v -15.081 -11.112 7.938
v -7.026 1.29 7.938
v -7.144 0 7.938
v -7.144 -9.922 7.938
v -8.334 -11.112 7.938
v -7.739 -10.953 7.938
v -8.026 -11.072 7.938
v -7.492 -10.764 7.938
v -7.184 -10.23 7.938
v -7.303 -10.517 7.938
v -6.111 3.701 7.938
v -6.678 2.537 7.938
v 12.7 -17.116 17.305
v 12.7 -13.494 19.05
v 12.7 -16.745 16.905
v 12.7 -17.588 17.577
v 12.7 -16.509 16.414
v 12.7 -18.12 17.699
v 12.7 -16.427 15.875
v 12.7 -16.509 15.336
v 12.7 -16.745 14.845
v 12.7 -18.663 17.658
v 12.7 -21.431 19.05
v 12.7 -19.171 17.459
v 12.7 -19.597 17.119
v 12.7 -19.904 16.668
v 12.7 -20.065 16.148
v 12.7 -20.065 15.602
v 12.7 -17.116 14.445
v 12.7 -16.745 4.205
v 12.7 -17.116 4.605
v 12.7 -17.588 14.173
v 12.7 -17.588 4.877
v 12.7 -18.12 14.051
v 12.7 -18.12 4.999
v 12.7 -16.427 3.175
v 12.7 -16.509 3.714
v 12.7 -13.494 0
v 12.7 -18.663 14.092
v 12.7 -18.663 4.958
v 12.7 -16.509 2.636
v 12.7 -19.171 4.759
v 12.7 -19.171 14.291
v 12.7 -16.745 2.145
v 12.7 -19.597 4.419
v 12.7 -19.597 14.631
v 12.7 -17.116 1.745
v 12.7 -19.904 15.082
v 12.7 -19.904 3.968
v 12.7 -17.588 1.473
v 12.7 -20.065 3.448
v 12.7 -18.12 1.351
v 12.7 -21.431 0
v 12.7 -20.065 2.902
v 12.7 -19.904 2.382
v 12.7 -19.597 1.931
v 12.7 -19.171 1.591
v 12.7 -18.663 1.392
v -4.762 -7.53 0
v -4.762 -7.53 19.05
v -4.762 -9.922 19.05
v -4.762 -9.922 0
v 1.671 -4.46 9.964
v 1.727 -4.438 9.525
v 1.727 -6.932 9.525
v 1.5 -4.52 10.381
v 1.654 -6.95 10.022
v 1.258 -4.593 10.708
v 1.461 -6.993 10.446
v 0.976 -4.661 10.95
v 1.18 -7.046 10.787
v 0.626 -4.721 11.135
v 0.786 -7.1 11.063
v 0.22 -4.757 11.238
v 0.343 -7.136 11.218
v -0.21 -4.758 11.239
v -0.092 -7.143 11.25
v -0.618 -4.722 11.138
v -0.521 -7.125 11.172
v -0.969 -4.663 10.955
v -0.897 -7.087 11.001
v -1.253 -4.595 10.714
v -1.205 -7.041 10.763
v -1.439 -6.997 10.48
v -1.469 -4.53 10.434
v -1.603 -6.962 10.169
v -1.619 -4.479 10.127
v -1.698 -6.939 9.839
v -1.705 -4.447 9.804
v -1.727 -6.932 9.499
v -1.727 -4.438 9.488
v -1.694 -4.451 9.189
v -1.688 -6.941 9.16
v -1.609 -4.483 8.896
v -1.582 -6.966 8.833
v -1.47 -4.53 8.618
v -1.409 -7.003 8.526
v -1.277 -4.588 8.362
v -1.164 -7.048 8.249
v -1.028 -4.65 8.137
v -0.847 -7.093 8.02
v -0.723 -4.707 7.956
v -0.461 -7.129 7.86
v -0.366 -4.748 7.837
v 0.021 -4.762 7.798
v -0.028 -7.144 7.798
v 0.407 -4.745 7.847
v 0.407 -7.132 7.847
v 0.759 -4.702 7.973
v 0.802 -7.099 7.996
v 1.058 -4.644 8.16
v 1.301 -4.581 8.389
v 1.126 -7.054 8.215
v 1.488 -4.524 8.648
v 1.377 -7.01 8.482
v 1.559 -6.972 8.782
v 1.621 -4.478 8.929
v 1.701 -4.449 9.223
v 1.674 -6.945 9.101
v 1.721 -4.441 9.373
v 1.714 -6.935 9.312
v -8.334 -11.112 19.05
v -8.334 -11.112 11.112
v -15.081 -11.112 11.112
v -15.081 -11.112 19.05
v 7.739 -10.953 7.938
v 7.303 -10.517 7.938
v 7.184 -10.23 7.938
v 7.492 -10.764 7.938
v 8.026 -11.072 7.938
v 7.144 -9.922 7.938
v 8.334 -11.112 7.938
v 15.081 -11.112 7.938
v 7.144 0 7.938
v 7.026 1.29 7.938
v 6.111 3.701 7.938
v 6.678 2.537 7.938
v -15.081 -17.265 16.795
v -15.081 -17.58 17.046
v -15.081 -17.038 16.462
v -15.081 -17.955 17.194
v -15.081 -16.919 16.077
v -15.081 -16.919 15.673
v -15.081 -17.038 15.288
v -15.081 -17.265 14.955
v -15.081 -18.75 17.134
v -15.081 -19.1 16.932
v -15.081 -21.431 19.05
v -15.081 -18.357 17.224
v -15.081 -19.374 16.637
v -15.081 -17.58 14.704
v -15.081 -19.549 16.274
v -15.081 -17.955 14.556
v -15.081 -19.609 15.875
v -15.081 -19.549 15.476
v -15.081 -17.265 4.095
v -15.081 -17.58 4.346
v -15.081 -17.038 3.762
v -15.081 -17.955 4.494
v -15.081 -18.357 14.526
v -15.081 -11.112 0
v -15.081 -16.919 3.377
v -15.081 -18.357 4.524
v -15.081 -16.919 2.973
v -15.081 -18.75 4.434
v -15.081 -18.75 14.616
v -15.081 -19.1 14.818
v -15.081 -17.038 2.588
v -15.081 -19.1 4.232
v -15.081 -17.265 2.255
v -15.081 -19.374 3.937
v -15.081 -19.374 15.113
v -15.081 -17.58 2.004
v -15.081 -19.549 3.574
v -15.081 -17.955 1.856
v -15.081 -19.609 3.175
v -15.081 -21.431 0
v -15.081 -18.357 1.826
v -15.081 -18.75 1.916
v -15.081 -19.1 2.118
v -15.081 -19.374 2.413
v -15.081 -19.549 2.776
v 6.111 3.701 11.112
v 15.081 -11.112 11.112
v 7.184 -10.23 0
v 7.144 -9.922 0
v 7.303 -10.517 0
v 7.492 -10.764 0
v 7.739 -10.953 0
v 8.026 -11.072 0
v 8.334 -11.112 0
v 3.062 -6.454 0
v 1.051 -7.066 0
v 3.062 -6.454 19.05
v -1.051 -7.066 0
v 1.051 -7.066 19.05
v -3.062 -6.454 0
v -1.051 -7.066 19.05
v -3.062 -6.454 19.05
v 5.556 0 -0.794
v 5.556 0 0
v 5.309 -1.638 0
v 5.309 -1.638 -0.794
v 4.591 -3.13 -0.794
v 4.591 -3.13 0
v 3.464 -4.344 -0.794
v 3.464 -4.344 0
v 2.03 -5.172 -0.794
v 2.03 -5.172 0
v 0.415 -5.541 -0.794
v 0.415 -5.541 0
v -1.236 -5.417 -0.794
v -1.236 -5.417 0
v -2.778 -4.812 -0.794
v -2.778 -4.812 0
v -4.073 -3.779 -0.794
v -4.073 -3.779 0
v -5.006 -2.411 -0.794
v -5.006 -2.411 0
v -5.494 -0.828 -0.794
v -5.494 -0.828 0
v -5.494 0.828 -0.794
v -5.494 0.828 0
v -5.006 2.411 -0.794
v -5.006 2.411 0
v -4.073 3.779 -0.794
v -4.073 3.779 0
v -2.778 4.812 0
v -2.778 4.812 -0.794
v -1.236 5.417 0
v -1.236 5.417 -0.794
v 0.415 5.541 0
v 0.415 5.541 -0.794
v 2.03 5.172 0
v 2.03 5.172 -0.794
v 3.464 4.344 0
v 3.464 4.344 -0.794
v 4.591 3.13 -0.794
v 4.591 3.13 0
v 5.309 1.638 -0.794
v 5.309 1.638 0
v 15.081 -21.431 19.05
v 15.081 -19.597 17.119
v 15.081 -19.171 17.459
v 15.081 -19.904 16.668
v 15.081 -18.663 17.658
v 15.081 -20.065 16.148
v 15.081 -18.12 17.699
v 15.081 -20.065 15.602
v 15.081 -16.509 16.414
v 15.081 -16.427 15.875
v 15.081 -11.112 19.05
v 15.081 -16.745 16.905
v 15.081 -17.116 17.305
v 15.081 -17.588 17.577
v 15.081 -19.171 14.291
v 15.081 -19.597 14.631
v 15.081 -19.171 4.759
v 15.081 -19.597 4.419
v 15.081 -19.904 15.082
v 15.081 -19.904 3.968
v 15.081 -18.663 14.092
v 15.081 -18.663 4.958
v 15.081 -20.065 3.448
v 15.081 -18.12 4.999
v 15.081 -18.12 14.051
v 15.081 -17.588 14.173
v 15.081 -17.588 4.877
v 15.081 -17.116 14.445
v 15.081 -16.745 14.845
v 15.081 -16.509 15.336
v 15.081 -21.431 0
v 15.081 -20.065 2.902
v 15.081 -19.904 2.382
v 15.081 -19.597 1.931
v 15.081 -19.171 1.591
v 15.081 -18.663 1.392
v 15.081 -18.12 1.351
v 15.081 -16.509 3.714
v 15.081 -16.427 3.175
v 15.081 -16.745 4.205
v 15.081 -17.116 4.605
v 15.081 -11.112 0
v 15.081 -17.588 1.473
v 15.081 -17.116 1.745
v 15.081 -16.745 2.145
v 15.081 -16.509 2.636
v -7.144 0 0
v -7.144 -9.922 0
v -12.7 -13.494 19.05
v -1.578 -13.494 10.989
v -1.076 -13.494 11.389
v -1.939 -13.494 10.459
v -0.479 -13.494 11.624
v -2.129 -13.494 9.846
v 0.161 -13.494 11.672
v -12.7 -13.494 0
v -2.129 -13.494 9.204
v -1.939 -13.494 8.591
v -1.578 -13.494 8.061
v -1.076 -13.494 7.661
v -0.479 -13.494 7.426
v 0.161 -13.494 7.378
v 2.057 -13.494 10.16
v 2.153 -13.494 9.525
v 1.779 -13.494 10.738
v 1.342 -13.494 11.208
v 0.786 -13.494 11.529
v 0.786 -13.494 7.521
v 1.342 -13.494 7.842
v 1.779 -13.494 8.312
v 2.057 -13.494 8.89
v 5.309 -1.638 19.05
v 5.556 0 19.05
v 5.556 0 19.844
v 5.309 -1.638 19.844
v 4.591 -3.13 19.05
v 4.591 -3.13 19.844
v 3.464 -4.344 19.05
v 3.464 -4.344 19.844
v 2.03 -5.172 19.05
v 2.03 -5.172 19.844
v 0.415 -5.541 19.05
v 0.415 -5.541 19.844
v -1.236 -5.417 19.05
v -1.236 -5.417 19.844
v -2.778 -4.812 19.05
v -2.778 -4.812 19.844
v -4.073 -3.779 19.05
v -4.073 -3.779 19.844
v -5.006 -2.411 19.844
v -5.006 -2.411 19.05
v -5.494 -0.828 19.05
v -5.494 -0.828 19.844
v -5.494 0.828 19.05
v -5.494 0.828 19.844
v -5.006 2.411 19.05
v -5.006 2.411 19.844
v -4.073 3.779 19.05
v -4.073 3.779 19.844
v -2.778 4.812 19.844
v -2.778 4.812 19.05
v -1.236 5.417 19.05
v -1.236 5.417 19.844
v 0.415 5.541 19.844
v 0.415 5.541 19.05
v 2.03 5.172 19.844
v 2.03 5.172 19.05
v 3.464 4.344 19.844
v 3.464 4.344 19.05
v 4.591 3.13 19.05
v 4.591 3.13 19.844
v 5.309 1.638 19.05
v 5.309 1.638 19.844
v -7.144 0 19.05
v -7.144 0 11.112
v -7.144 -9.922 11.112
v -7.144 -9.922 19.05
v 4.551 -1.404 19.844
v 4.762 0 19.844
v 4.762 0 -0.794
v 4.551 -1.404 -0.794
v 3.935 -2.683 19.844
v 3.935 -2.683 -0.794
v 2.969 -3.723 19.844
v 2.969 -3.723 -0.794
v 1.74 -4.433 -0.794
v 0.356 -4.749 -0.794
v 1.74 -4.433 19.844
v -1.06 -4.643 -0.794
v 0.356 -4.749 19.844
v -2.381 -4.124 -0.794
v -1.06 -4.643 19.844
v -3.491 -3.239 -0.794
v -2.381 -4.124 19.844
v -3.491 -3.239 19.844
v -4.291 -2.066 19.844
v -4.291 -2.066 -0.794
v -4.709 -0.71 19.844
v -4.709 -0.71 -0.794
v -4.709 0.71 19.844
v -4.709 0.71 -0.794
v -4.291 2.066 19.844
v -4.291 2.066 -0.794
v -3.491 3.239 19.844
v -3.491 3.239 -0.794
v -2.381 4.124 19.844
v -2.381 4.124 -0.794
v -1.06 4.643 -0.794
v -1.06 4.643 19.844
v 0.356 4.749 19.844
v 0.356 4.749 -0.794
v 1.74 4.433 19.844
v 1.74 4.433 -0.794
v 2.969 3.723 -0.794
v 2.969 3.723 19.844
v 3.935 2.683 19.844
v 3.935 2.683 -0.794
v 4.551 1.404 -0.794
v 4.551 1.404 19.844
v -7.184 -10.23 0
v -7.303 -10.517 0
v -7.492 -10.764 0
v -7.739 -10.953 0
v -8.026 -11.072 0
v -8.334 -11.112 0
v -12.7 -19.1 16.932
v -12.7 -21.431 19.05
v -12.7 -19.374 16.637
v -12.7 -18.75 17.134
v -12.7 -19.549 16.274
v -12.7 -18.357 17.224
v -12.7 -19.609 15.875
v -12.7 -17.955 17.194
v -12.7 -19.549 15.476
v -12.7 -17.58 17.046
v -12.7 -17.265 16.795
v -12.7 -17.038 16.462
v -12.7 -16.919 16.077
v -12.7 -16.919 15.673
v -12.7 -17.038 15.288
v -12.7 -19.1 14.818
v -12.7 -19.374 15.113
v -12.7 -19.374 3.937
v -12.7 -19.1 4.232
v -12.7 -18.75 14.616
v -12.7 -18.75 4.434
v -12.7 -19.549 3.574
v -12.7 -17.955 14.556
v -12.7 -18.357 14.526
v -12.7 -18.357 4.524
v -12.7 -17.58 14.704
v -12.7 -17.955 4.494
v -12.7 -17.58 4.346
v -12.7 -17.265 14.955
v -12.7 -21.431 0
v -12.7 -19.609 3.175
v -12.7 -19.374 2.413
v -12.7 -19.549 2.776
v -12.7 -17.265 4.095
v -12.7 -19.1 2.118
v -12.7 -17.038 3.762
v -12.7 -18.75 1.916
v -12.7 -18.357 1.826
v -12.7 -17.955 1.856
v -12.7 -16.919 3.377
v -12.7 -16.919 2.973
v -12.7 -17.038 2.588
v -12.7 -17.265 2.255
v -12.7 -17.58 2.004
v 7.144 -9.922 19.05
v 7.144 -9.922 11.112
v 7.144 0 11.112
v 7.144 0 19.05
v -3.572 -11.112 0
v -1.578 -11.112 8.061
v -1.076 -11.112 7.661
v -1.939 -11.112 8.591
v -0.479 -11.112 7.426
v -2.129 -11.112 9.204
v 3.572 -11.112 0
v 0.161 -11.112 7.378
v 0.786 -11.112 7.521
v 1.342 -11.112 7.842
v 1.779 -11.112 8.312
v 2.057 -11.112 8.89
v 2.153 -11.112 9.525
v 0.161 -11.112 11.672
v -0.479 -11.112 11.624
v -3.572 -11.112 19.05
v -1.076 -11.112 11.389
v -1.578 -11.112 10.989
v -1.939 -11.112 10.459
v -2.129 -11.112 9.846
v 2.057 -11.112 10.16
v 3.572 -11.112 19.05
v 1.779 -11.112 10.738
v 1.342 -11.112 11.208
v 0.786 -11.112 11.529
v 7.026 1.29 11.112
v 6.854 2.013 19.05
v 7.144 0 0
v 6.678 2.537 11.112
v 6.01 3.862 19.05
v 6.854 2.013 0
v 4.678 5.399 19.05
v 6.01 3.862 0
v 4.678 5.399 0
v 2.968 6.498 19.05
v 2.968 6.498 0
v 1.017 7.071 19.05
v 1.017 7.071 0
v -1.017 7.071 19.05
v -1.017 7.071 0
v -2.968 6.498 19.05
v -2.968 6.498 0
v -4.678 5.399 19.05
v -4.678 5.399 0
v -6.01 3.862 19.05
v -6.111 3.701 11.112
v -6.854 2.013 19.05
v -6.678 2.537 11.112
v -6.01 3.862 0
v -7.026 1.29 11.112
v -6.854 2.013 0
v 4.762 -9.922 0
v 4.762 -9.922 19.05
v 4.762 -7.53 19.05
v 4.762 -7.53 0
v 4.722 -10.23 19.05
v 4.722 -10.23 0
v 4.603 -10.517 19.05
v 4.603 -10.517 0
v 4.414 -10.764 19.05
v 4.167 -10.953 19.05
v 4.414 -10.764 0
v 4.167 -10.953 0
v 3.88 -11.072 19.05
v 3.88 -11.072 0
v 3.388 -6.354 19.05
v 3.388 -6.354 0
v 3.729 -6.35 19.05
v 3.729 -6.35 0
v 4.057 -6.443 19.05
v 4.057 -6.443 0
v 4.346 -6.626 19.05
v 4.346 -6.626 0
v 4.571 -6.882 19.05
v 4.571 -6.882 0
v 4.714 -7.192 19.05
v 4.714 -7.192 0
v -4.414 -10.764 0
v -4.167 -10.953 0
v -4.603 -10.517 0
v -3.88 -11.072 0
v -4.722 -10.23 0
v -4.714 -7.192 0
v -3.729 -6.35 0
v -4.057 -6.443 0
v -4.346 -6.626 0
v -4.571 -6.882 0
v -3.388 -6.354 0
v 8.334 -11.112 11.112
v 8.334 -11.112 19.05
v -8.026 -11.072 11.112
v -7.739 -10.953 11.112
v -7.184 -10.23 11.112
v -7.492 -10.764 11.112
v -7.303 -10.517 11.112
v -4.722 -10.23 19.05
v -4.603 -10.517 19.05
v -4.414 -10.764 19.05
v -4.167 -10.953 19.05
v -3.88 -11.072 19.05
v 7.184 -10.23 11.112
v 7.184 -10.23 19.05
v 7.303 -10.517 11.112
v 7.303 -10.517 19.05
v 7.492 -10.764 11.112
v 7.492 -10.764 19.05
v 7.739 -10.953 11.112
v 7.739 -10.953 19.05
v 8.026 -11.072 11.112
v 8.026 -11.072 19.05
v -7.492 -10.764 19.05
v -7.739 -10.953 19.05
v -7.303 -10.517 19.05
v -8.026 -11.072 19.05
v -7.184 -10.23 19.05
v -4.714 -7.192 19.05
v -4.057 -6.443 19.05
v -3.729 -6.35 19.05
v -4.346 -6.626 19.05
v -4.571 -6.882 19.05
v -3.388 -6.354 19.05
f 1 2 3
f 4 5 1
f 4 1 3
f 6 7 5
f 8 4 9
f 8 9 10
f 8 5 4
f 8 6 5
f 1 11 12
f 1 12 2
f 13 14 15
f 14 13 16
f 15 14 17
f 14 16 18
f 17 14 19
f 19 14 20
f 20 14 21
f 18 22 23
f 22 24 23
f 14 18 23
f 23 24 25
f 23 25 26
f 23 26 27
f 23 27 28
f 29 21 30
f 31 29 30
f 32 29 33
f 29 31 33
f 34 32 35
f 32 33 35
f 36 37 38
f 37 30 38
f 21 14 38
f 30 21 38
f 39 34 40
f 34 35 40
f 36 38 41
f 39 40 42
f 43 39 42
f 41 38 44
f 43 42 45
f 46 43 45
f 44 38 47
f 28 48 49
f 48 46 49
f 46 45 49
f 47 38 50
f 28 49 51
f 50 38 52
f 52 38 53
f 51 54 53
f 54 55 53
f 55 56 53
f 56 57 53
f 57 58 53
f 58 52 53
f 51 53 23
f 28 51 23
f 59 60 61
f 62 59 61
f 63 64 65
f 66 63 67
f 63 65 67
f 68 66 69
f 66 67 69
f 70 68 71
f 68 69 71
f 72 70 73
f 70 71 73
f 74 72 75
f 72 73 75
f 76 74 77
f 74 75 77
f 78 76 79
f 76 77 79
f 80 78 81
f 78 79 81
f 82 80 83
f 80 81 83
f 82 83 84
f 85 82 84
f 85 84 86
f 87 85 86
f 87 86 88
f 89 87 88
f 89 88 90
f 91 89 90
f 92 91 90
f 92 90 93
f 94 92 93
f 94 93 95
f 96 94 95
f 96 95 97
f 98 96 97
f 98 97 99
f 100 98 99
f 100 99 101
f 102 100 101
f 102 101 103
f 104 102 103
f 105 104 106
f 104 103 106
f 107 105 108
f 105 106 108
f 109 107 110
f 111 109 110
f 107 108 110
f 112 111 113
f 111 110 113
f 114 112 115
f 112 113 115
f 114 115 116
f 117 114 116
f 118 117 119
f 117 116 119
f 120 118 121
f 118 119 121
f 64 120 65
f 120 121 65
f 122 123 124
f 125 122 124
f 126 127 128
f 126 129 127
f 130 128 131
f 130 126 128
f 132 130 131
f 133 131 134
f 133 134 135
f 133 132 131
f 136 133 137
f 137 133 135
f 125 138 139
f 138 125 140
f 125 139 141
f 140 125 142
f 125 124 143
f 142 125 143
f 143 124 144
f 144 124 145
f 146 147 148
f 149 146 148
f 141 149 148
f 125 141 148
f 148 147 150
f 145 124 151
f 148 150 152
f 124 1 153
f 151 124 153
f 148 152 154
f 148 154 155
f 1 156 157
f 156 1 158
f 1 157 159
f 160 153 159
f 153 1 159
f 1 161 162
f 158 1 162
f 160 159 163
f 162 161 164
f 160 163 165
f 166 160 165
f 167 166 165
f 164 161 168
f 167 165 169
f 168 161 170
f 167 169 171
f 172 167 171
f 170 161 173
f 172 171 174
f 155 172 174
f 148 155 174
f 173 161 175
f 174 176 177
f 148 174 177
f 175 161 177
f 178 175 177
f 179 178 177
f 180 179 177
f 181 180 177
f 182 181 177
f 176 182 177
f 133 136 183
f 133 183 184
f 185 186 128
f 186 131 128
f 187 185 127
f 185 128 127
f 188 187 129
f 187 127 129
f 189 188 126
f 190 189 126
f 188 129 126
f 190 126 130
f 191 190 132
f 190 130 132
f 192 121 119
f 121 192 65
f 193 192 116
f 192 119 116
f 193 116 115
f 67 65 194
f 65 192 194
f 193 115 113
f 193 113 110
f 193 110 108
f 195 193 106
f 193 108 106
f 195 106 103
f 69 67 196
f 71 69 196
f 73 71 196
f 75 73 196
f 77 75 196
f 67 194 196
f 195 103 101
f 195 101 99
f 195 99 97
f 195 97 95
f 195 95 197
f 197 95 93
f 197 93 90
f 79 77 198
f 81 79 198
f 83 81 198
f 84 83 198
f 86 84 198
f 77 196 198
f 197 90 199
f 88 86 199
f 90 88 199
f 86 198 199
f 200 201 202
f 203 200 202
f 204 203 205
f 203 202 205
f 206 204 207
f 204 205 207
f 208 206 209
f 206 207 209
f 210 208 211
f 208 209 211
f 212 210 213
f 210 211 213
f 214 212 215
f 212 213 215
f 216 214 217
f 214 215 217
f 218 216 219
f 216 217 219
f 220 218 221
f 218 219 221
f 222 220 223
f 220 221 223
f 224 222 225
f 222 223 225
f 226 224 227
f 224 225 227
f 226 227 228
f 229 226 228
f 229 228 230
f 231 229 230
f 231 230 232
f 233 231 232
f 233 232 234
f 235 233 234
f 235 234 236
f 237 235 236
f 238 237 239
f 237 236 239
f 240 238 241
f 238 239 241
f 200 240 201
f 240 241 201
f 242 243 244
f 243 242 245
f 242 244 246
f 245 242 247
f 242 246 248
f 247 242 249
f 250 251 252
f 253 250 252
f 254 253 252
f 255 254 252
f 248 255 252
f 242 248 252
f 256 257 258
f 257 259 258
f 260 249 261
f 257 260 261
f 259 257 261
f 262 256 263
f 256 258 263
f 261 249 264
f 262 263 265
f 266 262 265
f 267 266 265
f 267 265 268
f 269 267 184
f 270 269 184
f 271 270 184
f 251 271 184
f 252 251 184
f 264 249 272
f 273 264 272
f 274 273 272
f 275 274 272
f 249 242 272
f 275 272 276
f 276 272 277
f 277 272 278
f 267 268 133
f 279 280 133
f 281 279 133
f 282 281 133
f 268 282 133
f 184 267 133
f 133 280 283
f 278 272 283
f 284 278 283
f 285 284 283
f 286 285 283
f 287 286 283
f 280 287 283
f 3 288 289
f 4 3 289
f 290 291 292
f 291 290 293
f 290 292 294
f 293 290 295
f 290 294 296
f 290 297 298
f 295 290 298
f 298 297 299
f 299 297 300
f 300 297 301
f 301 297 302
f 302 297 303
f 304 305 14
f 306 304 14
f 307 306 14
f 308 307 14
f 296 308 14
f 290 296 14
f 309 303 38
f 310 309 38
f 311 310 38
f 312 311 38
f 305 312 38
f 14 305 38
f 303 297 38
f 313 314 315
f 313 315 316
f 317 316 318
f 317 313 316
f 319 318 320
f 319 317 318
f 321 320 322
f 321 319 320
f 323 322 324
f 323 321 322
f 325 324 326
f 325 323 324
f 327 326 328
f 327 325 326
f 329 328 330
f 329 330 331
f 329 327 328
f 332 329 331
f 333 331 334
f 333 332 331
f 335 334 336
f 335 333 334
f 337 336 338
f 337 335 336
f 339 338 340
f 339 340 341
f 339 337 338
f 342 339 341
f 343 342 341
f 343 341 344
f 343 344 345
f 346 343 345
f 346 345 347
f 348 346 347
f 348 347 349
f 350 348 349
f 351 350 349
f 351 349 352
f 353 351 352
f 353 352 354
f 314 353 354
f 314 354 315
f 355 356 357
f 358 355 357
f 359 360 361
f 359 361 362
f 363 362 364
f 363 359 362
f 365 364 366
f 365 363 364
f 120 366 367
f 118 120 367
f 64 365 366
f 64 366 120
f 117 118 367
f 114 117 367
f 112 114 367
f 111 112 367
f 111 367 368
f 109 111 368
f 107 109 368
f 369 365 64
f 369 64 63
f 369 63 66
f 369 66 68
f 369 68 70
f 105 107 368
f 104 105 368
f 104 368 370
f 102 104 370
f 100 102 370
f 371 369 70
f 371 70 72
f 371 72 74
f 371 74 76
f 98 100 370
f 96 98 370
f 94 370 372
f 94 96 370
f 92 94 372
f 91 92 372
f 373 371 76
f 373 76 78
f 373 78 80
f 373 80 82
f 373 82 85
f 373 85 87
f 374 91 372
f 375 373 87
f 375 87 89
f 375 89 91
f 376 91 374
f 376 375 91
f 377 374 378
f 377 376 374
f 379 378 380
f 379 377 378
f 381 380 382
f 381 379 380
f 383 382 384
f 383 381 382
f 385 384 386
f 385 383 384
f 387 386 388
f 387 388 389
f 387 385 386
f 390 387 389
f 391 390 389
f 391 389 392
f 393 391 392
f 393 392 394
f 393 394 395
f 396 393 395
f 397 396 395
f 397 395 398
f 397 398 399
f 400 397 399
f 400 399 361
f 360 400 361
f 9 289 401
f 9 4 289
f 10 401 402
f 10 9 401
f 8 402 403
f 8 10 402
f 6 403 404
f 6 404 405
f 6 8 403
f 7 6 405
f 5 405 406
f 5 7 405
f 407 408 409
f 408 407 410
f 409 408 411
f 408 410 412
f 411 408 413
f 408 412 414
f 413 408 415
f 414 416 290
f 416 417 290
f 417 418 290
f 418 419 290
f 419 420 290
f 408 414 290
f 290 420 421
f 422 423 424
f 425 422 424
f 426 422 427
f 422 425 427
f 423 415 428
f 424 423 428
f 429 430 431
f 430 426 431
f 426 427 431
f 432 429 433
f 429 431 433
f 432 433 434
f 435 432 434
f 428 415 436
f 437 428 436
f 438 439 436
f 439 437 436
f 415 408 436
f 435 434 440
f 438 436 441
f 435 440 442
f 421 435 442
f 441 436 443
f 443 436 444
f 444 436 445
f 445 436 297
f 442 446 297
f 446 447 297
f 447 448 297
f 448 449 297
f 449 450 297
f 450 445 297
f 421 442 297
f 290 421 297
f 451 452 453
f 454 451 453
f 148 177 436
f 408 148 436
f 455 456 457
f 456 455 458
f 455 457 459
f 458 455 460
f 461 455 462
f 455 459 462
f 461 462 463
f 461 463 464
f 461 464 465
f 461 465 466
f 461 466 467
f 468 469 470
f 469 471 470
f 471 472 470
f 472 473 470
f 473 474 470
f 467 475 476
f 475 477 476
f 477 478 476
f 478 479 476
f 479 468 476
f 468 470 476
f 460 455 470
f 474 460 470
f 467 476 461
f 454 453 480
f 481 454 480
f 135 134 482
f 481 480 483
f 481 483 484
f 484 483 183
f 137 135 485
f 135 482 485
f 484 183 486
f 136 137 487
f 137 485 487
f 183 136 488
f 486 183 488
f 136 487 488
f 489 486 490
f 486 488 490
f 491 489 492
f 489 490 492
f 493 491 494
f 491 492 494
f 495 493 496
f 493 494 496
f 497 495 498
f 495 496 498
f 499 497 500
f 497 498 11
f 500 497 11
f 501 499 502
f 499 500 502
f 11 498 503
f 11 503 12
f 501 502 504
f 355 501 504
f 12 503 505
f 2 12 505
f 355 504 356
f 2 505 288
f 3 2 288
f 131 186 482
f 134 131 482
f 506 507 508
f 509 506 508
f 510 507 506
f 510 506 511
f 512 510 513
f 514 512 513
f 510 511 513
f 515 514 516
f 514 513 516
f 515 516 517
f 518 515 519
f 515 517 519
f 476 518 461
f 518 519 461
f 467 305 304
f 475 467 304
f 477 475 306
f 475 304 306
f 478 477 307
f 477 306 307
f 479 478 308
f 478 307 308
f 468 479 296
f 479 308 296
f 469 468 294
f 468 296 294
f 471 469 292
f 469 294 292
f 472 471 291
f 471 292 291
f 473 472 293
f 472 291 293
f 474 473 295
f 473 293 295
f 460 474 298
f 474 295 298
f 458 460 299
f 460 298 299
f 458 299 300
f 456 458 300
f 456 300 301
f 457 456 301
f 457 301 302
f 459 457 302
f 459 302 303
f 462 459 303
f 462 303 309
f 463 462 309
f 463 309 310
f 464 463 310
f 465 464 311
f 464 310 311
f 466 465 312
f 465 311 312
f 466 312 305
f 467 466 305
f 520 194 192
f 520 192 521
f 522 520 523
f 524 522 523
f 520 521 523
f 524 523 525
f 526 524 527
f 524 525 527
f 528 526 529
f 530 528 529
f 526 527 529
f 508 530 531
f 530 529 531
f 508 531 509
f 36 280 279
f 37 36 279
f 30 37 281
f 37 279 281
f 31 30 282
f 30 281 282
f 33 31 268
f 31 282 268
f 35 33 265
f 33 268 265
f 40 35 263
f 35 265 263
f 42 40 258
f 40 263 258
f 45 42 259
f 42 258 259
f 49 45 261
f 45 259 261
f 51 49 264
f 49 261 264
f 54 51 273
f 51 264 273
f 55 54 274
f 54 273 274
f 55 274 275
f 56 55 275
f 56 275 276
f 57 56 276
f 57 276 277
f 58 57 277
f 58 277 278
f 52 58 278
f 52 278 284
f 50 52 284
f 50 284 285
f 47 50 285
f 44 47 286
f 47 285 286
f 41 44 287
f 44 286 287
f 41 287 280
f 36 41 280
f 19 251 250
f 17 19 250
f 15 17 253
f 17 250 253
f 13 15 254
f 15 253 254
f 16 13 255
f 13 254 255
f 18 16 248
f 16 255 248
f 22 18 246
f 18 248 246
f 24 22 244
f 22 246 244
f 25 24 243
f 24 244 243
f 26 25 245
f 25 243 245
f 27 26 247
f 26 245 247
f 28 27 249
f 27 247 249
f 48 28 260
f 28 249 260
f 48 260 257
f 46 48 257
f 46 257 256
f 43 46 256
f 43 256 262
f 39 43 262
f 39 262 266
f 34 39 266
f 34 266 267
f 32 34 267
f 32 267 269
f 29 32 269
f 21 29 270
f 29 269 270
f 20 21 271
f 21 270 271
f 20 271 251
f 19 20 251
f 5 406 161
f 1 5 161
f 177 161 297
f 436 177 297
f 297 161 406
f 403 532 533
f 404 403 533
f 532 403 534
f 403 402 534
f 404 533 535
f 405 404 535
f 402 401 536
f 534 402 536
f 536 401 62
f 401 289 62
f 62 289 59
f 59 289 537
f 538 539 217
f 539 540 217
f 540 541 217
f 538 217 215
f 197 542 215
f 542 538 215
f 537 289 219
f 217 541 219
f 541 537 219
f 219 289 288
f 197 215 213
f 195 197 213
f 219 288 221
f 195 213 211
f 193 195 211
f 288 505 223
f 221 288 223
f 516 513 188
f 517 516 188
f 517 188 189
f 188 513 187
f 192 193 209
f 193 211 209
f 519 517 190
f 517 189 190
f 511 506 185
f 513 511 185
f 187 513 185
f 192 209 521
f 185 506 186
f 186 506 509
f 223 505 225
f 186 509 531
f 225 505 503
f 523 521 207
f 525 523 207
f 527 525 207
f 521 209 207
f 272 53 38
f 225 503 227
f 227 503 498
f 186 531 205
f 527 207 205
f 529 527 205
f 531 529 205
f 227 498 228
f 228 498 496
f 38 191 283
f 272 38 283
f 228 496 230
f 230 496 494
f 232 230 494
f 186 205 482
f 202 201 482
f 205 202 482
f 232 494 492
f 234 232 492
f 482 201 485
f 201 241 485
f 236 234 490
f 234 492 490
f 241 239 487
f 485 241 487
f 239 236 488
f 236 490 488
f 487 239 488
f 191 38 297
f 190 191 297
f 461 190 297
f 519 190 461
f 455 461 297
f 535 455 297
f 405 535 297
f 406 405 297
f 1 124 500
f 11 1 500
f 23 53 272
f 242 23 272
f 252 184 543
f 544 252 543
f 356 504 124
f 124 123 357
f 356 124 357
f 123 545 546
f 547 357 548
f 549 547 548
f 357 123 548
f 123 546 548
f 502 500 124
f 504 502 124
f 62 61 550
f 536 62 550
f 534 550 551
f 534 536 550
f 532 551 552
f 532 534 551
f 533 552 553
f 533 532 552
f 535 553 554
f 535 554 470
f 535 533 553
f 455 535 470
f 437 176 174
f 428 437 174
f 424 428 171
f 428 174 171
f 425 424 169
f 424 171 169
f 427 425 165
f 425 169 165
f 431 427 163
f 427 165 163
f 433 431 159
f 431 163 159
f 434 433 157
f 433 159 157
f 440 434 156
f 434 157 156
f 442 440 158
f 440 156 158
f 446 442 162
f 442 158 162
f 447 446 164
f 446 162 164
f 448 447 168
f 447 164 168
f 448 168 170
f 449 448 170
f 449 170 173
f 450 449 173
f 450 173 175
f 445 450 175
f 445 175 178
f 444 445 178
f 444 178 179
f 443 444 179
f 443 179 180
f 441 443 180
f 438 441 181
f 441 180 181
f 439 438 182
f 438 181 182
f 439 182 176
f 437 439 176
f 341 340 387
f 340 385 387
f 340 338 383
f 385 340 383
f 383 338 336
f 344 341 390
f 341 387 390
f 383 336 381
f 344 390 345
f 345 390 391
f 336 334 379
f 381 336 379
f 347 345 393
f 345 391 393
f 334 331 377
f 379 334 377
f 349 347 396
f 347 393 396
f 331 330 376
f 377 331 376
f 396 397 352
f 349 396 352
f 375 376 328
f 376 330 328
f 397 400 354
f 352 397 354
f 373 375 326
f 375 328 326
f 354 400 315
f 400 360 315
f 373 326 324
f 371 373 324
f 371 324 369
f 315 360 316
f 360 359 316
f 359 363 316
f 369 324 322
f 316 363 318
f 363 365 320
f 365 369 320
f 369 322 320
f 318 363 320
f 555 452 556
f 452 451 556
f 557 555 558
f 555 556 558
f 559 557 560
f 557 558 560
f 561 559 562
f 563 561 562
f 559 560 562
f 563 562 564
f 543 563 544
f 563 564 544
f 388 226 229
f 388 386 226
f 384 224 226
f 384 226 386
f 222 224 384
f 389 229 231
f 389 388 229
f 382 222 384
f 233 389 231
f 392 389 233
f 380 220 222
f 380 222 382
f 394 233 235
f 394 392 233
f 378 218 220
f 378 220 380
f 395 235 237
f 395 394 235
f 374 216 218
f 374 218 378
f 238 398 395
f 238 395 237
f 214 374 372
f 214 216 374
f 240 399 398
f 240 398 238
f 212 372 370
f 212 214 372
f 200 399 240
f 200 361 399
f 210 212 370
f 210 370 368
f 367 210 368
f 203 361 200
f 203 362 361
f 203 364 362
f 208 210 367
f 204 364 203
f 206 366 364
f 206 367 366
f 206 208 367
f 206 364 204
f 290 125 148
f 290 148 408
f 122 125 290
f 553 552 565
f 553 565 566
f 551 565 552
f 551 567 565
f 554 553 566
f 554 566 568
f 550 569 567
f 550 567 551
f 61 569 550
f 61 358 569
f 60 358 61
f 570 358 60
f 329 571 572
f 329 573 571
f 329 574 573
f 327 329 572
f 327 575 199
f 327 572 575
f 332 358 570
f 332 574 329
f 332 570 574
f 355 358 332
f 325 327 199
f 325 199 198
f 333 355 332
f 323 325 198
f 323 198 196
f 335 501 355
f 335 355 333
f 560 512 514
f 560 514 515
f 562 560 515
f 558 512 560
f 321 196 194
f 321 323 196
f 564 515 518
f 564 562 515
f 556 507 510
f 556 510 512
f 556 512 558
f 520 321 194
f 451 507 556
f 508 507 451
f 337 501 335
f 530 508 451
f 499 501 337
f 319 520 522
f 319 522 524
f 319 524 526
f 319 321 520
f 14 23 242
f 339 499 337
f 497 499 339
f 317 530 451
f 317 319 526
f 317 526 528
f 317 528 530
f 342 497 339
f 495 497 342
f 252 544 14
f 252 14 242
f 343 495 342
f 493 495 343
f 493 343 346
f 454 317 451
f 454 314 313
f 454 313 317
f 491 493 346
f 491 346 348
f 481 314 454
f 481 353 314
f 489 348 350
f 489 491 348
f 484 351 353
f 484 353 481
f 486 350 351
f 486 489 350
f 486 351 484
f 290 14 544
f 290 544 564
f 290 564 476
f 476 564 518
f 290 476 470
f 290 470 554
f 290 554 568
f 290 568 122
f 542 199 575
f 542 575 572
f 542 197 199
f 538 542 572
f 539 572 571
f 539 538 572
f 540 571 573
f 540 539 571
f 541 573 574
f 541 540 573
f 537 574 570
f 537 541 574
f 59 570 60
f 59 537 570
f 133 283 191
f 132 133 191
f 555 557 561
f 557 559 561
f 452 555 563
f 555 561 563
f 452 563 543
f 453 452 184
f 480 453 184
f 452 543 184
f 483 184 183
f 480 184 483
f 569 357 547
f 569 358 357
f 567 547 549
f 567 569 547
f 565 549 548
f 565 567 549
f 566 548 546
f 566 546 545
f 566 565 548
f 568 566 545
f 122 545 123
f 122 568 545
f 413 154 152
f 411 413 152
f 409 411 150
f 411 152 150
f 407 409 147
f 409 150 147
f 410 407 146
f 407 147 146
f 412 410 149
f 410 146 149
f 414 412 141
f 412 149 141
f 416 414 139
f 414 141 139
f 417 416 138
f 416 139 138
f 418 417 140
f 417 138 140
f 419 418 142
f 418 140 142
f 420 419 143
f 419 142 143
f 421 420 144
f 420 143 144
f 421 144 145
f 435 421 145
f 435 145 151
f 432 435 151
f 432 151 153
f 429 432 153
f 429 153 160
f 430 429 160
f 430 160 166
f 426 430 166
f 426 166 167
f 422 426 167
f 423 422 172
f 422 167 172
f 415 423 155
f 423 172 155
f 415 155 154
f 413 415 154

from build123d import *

# Parameters (mm, degrees)
F0_R           = 4.7625
F1_DEPTH       = 19.05
F2_R           = 1.8288
F3_DEPTH       = 2.38125
F4_R           = 1.35255
F5_DEPTH       = 2.38125
F8_DEPTH       = 1.5875
F9_R           = 5.55625
F9_R_2         = 4.7625
F11_DEPTH      = 0.79375
F11_DEPTH_BACK = 19.84375
F12_R          = 1.7272
F13_DEPTH      = 10.0554862042
F15_DEPTH      = 19.05
F16_R          = 2.15265
F17_DEPTH      = 2.38125
F18_R          = 1.190625


with BuildPart() as f1:
    # F0 (on Top) → F1 (new body)
    with BuildSketch(Plane.XY):
        with BuildLine():
            Line((7.14375, -11.1125), (7.14375, 0))
            ThreePointArc((7.14375, 0), (0, 7.14375), (-7.14375, 0))
            Line((-7.14375, 0), (-7.14375, -11.1125))
            Line((-7.14375, -11.1125), (-15.08125, -11.1125))
            Line((-15.08125, -11.1125), (-15.08125, -21.43125))
            Line((-15.08125, -21.43125), (-12.7, -21.43125))
            Line((-12.7, -21.43125), (-12.7, -13.49375))
            Line((-12.7, -13.49375), (12.7, -13.49375))
            Line((12.7, -13.49375), (12.7, -21.43125))
            Line((12.7, -21.43125), (15.08125, -21.43125))
            Line((15.08125, -21.43125), (15.08125, -11.1125))
            Line((15.08125, -11.1125), (7.14375, -11.1125))
        make_face()
        Circle(F0_R, mode=Mode.SUBTRACT)
    extrude(amount=F1_DEPTH)

    # F2 (on face) → F3 (cut, through all)
    with BuildSketch(Plane.YZ.offset(15.08125)):
        with Locations((-18.25625, 15.875)):
            Circle(F2_R)
        with Locations((-18.25625, 3.175)):
            Circle(F2_R)
    extrude(amount=-F3_DEPTH, mode=Mode.SUBTRACT)

    # F4 (on face) → F5 (cut, through all)
    with BuildSketch(Plane(origin=(-15.08125, 0, 0), x_dir=(0, -1, 0), z_dir=(-1, 0, 0))):
        with Locations((18.25625, 3.175)):
            Circle(F4_R)
        with Locations((18.25625, 15.875)):
            Circle(F4_R)
    extrude(amount=-F5_DEPTH, mode=Mode.SUBTRACT)

    # F7 (on offset) → F8 (join, symmetric)
    with BuildSketch(Plane(origin=(0, 0, 9.525), x_dir=(1, 0, 0), z_dir=(0, 0, -1))):
        with BuildLine():
            Line((-15.08125, 11.1125), (-6.1105859798, -3.7005274011))
            ThreePointArc((-6.1105859798, -3.7005274011), (-6.8806127146, -1.9210238767), (-7.14375, 0))
            Line((-7.14375, 0), (-7.14375, 11.1125))
            Line((-7.14375, 11.1125), (-15.08125, 11.1125))
        make_face()
        with BuildLine():
            ThreePointArc((7.14375, 0), (6.8806127146, -1.9210238767), (6.1105859798, -3.7005274011))
            Line((6.1105859798, -3.7005274011), (15.08125, 11.1125))
            Line((15.08125, 11.1125), (7.14375, 11.1125))
            Line((7.14375, 11.1125), (7.14375, 0))
        make_face()
    extrude(amount=F8_DEPTH, both=True)

    # F9 (on face) → F11 (join, two sides)
    with BuildSketch(Plane(origin=(0, 0, 0), x_dir=(1, 0, 0), z_dir=(0, 0, -1))) as f11_sk:
        Circle(F9_R)
        Circle(F9_R_2, mode=Mode.SUBTRACT)
    extrude(amount=F11_DEPTH)
    extrude(f11_sk.sketch, amount=-F11_DEPTH_BACK)

    # F12 (on face) → F13 (cut, up to face)
    with BuildSketch(Plane.XZ.offset(13.49375)):
        with Locations((0, 9.525)):
            Circle(F12_R)
    extrude(amount=-F13_DEPTH, mode=Mode.SUBTRACT)

    # F14 (on face) → F15 (cut, through all)
    with BuildSketch(Plane.XY.offset(19.05)):
        with BuildLine():
            Line((-4.7625, -5.3246368714), (-4.7625, -11.1125))
            Line((-4.7625, -11.1125), (4.7625, -11.1125))
            Line((4.7625, -11.1125), (4.7625, -5.3246368714))
            ThreePointArc((4.7625, -5.3246368714), (0, -7.14375), (-4.7625, -5.3246368714))
        make_face()
    extrude(amount=-F15_DEPTH, mode=Mode.SUBTRACT)

    # F16 (on face) → F17 (cut, through all)
    with BuildSketch(Plane.XZ.offset(13.49375)):
        with Locations((0, 9.525)):
            Circle(F16_R)
    extrude(amount=-F17_DEPTH, mode=Mode.SUBTRACT)

    # F18
    f18_edges = [f1.edges().sort_by_distance(p)[0] for p in [
        (7.14375, -11.1125, 15.08125),
        (7.14375, -11.1125, 3.96875),
        (-7.14375, -11.1125, 15.08125),
        (-7.14375, -11.1125, 3.96875),
        (-4.7625, -11.1125, 9.525),
        (4.7625, -11.1125, 9.525),
        (4.7625, -5.324637, 9.525),
        (-4.7625, -5.324637, 9.525),
    ]]
    fillet(f18_edges, radius=F18_R)


solid = f1.part
